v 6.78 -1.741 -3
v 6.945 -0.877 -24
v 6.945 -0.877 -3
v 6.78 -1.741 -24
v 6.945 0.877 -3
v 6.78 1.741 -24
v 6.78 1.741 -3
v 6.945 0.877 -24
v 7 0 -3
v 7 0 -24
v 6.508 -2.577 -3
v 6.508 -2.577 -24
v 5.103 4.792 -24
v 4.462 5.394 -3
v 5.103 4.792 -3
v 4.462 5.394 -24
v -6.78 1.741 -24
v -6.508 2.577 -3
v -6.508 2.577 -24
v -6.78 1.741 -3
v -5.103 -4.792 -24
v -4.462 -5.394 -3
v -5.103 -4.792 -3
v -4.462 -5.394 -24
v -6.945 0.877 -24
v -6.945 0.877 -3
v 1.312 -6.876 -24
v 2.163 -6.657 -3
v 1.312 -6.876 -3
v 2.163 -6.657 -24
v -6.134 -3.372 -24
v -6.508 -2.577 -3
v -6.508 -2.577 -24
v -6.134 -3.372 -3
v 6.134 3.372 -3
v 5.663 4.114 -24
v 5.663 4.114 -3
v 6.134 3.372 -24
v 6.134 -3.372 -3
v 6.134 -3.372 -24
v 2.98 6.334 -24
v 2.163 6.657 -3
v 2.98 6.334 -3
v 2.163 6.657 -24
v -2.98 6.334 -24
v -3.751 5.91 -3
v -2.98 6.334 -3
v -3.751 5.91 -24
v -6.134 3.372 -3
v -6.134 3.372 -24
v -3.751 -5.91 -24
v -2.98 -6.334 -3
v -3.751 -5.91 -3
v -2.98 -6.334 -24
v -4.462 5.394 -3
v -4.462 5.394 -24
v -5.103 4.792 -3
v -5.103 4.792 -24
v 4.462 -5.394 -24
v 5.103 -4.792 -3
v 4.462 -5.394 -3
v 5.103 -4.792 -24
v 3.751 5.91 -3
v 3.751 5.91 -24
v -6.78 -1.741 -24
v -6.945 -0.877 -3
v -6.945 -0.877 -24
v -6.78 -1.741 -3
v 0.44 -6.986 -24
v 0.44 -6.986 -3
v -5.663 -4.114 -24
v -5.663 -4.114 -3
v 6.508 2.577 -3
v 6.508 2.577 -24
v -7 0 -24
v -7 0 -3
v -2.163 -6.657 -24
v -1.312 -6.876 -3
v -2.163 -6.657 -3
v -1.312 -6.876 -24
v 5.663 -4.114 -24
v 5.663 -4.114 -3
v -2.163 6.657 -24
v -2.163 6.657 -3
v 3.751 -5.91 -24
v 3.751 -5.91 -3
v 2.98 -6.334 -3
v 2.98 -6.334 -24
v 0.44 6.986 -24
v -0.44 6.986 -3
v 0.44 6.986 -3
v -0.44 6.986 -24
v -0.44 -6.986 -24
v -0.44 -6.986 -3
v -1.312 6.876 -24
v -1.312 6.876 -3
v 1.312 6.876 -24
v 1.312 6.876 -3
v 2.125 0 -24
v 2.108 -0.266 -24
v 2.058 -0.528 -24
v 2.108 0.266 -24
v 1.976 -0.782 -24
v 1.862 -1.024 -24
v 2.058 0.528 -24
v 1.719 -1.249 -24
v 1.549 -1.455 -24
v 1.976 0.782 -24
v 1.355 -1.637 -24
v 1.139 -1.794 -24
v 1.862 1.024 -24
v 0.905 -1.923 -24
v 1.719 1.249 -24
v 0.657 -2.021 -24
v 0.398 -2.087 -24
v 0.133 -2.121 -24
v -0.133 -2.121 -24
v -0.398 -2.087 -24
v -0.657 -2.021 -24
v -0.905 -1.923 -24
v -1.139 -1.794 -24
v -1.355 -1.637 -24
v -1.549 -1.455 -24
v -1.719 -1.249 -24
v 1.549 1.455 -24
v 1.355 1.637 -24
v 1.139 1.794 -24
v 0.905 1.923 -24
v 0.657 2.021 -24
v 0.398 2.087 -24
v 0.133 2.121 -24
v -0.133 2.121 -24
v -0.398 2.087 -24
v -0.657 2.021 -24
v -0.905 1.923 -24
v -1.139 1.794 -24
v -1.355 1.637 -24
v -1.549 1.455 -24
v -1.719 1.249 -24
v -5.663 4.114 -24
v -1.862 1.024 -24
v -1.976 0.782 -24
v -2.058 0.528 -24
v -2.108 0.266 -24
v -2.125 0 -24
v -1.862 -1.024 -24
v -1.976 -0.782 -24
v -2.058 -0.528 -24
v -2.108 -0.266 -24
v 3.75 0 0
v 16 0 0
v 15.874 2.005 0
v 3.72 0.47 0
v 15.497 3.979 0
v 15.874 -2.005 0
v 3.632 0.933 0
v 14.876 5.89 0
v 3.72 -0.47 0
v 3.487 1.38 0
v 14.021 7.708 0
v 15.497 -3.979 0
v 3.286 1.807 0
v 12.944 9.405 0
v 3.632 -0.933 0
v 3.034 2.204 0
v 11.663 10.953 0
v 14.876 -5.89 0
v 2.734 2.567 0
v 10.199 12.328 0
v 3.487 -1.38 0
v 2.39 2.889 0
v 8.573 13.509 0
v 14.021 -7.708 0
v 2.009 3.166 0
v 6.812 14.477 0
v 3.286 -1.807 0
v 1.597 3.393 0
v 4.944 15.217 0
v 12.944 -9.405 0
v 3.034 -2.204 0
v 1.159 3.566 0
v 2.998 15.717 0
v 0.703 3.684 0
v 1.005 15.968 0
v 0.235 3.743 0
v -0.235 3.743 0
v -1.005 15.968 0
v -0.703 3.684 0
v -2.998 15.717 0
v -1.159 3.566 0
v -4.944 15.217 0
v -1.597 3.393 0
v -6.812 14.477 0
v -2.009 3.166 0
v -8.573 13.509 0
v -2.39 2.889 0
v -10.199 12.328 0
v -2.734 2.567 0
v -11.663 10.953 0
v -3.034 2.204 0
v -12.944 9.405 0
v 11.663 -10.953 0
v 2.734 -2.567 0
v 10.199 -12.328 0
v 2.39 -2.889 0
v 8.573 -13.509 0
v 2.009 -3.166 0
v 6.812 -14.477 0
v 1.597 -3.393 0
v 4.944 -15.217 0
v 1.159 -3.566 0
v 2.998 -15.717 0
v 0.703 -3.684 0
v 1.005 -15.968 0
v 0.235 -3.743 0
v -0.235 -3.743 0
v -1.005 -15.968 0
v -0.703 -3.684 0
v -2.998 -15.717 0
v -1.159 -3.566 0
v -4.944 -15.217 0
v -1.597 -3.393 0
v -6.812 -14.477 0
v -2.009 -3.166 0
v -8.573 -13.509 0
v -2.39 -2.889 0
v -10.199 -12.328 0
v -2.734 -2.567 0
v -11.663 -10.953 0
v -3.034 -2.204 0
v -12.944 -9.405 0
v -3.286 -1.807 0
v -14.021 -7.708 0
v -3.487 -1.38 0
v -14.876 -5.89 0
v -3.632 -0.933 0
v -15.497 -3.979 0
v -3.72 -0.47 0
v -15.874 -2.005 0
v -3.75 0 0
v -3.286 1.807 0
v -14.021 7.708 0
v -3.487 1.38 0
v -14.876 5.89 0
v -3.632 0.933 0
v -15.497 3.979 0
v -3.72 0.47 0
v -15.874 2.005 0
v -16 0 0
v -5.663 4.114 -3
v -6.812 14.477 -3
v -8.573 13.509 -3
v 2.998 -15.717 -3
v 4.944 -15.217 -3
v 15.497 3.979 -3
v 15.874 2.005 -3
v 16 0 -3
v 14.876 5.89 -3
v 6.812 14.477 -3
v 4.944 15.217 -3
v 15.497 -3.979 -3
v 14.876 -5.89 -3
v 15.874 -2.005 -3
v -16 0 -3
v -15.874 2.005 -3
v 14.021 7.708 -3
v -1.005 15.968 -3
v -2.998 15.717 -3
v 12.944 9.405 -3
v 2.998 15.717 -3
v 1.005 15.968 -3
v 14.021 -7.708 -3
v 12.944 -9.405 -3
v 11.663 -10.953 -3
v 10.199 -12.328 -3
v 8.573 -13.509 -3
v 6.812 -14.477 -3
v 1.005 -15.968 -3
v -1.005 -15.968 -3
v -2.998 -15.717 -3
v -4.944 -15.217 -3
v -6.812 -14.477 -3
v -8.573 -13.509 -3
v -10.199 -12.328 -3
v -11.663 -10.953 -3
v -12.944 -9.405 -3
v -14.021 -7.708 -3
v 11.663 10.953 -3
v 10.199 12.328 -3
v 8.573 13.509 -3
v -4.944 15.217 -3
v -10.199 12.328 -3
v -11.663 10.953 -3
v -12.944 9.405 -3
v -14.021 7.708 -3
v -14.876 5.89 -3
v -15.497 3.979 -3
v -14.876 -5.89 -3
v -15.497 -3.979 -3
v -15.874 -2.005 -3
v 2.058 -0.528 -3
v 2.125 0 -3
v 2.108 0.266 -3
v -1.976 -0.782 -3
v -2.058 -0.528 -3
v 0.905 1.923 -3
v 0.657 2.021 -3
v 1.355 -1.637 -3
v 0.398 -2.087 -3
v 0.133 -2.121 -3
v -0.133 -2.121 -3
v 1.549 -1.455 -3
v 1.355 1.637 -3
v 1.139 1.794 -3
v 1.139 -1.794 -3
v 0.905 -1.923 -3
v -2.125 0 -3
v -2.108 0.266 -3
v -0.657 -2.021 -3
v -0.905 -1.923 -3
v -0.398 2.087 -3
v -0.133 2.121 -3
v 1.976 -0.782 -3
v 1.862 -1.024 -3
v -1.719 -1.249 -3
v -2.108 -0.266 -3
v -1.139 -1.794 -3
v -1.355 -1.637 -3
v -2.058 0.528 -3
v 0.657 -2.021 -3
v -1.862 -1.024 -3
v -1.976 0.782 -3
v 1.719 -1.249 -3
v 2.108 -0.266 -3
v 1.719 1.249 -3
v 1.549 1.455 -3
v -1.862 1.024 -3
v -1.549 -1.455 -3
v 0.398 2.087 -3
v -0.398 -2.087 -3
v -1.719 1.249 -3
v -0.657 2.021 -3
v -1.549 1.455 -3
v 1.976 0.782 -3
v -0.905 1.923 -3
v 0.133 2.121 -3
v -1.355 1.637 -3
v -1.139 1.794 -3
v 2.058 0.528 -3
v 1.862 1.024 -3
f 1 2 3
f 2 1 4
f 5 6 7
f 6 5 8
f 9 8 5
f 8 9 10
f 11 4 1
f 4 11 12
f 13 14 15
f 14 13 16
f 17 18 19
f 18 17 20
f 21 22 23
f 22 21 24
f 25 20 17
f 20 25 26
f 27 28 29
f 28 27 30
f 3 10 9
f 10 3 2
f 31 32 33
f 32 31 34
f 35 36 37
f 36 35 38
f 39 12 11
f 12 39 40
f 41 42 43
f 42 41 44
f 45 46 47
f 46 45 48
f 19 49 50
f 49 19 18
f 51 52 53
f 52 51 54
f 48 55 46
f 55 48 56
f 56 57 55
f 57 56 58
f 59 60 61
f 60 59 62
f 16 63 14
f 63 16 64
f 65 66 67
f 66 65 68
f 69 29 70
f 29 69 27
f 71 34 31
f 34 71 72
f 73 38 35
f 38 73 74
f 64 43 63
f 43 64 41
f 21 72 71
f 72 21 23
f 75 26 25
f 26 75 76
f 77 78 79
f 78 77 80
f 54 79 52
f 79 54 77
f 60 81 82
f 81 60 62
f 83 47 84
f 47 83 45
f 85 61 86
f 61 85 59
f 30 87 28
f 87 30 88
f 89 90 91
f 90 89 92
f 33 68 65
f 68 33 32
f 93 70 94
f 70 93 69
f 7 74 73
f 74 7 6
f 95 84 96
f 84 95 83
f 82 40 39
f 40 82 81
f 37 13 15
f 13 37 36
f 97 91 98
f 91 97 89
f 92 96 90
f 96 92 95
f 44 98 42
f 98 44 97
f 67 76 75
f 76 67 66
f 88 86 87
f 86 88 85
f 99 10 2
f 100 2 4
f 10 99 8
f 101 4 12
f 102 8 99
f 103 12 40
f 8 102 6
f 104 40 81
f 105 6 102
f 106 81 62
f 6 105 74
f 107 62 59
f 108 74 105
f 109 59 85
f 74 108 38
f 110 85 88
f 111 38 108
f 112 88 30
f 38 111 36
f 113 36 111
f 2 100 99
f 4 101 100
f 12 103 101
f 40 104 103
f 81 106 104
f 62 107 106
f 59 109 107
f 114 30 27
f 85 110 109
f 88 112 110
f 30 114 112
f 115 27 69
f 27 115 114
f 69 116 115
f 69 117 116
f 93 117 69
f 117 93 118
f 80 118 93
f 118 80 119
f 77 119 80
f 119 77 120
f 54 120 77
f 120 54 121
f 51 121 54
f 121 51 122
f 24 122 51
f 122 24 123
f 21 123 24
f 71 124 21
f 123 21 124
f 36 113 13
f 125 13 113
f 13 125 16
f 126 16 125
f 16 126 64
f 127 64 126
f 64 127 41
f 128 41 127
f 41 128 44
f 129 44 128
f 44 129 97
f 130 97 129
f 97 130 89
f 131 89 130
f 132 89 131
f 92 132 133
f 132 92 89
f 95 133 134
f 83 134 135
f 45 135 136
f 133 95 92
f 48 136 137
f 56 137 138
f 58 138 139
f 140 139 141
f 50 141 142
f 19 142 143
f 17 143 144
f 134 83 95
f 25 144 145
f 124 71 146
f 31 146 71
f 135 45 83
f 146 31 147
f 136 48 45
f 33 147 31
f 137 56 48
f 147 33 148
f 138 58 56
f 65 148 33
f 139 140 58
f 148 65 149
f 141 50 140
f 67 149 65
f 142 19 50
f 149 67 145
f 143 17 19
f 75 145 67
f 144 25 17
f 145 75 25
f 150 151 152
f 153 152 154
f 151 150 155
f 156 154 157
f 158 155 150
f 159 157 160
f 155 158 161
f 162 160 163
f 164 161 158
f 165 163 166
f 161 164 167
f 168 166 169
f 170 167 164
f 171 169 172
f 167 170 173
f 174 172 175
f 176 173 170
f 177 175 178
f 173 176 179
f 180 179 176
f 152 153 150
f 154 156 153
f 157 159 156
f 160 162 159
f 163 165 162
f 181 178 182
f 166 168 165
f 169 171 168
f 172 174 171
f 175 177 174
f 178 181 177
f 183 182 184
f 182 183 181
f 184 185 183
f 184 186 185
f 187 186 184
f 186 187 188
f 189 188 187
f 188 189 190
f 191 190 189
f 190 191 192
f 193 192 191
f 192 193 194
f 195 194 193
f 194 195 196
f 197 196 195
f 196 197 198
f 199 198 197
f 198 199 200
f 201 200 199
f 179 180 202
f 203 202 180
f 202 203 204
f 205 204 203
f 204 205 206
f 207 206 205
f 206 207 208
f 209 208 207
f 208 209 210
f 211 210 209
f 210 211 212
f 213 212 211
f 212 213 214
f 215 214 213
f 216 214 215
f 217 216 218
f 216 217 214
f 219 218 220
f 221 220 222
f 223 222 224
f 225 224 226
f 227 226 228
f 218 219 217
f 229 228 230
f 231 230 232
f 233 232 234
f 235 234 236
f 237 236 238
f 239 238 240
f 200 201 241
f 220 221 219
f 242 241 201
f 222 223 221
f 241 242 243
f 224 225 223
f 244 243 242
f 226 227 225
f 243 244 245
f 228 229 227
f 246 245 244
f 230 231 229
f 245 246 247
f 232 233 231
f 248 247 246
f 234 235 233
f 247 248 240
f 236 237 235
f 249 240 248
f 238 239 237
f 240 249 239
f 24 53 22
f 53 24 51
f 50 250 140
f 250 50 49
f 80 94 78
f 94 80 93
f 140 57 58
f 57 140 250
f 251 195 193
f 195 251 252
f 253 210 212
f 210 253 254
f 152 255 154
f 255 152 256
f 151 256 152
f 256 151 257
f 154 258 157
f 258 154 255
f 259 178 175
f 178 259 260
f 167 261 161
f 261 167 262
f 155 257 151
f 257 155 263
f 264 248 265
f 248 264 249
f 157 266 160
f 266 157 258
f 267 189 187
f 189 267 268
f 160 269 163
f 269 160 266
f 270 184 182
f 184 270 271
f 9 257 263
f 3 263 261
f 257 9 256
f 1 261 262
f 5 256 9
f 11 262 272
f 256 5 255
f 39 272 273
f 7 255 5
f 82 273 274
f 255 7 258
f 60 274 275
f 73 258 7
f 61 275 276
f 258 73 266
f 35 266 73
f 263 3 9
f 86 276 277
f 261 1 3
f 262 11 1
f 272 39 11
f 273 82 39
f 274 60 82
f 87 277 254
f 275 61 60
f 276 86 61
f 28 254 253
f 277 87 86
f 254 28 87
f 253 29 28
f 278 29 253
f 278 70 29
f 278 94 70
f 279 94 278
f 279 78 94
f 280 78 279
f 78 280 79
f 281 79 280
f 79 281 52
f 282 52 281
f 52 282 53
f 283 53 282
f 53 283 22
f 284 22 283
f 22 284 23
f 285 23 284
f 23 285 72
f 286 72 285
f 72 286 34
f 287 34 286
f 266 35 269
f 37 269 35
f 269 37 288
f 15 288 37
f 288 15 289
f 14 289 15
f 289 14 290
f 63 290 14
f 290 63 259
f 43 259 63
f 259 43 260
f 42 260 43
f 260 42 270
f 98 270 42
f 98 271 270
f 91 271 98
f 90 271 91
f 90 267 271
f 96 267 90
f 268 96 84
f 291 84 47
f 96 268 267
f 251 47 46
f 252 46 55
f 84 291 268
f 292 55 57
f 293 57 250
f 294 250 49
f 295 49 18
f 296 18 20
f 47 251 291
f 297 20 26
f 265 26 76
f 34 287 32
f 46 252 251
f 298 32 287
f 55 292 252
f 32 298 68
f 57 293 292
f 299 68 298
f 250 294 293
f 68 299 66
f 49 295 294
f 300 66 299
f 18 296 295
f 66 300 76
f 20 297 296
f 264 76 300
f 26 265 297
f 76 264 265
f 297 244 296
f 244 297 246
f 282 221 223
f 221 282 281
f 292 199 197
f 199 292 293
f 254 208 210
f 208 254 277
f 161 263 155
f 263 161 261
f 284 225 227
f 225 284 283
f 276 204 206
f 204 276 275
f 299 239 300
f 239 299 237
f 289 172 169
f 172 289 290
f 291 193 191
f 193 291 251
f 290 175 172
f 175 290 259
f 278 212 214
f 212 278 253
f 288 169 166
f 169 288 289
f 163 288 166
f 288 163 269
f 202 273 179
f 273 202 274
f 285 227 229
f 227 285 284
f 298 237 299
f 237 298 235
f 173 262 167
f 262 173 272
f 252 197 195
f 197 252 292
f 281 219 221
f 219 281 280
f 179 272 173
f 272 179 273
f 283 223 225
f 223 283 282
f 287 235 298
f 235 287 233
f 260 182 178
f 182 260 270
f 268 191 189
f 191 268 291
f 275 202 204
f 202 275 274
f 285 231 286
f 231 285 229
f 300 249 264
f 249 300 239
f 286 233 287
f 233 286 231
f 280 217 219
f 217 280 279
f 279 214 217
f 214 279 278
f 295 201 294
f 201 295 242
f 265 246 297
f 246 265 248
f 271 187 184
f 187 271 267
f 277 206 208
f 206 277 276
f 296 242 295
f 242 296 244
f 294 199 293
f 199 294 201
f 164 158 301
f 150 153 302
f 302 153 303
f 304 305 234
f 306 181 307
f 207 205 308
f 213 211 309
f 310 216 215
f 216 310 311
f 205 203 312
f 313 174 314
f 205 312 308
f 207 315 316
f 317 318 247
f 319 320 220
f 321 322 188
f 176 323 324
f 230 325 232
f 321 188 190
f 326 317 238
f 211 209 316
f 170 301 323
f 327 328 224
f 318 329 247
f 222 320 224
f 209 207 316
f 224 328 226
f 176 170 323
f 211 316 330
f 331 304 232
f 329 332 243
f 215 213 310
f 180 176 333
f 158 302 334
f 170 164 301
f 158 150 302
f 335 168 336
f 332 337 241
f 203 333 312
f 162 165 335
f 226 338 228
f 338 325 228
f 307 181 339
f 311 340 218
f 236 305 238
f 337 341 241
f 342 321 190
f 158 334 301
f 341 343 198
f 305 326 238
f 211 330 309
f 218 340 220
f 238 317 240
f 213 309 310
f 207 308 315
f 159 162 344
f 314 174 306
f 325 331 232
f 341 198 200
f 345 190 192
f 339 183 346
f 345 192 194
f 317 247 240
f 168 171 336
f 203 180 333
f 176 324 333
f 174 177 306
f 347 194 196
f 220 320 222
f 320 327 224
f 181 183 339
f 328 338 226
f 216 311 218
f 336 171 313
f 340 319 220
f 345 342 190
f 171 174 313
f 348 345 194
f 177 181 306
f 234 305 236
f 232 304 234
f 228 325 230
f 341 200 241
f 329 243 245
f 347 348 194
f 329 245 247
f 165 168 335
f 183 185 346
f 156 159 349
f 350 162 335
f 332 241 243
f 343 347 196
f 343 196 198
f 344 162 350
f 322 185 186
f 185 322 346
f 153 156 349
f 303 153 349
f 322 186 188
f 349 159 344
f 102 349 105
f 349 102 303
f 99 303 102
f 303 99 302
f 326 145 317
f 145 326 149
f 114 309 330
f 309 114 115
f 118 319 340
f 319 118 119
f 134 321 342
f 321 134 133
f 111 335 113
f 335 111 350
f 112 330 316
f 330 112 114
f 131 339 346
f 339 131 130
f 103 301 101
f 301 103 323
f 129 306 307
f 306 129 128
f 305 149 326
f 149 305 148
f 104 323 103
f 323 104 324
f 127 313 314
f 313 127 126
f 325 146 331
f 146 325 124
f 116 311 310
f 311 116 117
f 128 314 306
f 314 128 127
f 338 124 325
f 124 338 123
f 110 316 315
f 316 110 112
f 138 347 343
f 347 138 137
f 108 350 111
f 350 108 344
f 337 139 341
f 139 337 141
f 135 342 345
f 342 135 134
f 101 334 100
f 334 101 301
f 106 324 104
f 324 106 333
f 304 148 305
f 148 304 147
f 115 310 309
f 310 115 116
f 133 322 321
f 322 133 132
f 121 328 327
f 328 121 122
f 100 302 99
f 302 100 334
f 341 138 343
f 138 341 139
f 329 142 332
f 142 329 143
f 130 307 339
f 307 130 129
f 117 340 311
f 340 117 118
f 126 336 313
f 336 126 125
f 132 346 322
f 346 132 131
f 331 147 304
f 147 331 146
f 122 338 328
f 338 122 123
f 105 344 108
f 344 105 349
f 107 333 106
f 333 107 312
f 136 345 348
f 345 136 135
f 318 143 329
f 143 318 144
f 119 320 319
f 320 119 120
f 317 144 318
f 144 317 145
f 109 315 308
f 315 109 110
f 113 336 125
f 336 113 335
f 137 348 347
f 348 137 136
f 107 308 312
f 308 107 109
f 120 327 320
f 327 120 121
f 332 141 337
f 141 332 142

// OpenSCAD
$fn = 50;


difference() {
	union() {
		translate(v = [0, 0, -24.0000000000]) {
			cylinder(h = 24, r = 7.0000000000);
		}
		translate(v = [0, 0, -3.0000000000]) {
			cylinder(h = 3, r = 16.0000000000);
		}
	}
	union() {
		translate(v = [0, 0, 0]) {
			rotate(a = [0, 0, 0]) {
				difference() {
					union() {
						#translate(v = [0, 0, -24.0000000000]) {
							cylinder(h = 24, r = 2.0000000000);
						}
						#translate(v = [0, 0, -3]) {
							cylinder(h = 3, r1 = 2.1250000000, r2 = 3.7500000000);
						}
						#translate(v = [0, 0, -24.0000000000]) {
							cylinder(h = 24, r = 2.1250000000);
						}
						#translate(v = [0, 0, -24.0000000000]) {
							cylinder(h = 24, r = 2.0000000000);
						}
					}
					union();
				}
			}
		}
	}
}
